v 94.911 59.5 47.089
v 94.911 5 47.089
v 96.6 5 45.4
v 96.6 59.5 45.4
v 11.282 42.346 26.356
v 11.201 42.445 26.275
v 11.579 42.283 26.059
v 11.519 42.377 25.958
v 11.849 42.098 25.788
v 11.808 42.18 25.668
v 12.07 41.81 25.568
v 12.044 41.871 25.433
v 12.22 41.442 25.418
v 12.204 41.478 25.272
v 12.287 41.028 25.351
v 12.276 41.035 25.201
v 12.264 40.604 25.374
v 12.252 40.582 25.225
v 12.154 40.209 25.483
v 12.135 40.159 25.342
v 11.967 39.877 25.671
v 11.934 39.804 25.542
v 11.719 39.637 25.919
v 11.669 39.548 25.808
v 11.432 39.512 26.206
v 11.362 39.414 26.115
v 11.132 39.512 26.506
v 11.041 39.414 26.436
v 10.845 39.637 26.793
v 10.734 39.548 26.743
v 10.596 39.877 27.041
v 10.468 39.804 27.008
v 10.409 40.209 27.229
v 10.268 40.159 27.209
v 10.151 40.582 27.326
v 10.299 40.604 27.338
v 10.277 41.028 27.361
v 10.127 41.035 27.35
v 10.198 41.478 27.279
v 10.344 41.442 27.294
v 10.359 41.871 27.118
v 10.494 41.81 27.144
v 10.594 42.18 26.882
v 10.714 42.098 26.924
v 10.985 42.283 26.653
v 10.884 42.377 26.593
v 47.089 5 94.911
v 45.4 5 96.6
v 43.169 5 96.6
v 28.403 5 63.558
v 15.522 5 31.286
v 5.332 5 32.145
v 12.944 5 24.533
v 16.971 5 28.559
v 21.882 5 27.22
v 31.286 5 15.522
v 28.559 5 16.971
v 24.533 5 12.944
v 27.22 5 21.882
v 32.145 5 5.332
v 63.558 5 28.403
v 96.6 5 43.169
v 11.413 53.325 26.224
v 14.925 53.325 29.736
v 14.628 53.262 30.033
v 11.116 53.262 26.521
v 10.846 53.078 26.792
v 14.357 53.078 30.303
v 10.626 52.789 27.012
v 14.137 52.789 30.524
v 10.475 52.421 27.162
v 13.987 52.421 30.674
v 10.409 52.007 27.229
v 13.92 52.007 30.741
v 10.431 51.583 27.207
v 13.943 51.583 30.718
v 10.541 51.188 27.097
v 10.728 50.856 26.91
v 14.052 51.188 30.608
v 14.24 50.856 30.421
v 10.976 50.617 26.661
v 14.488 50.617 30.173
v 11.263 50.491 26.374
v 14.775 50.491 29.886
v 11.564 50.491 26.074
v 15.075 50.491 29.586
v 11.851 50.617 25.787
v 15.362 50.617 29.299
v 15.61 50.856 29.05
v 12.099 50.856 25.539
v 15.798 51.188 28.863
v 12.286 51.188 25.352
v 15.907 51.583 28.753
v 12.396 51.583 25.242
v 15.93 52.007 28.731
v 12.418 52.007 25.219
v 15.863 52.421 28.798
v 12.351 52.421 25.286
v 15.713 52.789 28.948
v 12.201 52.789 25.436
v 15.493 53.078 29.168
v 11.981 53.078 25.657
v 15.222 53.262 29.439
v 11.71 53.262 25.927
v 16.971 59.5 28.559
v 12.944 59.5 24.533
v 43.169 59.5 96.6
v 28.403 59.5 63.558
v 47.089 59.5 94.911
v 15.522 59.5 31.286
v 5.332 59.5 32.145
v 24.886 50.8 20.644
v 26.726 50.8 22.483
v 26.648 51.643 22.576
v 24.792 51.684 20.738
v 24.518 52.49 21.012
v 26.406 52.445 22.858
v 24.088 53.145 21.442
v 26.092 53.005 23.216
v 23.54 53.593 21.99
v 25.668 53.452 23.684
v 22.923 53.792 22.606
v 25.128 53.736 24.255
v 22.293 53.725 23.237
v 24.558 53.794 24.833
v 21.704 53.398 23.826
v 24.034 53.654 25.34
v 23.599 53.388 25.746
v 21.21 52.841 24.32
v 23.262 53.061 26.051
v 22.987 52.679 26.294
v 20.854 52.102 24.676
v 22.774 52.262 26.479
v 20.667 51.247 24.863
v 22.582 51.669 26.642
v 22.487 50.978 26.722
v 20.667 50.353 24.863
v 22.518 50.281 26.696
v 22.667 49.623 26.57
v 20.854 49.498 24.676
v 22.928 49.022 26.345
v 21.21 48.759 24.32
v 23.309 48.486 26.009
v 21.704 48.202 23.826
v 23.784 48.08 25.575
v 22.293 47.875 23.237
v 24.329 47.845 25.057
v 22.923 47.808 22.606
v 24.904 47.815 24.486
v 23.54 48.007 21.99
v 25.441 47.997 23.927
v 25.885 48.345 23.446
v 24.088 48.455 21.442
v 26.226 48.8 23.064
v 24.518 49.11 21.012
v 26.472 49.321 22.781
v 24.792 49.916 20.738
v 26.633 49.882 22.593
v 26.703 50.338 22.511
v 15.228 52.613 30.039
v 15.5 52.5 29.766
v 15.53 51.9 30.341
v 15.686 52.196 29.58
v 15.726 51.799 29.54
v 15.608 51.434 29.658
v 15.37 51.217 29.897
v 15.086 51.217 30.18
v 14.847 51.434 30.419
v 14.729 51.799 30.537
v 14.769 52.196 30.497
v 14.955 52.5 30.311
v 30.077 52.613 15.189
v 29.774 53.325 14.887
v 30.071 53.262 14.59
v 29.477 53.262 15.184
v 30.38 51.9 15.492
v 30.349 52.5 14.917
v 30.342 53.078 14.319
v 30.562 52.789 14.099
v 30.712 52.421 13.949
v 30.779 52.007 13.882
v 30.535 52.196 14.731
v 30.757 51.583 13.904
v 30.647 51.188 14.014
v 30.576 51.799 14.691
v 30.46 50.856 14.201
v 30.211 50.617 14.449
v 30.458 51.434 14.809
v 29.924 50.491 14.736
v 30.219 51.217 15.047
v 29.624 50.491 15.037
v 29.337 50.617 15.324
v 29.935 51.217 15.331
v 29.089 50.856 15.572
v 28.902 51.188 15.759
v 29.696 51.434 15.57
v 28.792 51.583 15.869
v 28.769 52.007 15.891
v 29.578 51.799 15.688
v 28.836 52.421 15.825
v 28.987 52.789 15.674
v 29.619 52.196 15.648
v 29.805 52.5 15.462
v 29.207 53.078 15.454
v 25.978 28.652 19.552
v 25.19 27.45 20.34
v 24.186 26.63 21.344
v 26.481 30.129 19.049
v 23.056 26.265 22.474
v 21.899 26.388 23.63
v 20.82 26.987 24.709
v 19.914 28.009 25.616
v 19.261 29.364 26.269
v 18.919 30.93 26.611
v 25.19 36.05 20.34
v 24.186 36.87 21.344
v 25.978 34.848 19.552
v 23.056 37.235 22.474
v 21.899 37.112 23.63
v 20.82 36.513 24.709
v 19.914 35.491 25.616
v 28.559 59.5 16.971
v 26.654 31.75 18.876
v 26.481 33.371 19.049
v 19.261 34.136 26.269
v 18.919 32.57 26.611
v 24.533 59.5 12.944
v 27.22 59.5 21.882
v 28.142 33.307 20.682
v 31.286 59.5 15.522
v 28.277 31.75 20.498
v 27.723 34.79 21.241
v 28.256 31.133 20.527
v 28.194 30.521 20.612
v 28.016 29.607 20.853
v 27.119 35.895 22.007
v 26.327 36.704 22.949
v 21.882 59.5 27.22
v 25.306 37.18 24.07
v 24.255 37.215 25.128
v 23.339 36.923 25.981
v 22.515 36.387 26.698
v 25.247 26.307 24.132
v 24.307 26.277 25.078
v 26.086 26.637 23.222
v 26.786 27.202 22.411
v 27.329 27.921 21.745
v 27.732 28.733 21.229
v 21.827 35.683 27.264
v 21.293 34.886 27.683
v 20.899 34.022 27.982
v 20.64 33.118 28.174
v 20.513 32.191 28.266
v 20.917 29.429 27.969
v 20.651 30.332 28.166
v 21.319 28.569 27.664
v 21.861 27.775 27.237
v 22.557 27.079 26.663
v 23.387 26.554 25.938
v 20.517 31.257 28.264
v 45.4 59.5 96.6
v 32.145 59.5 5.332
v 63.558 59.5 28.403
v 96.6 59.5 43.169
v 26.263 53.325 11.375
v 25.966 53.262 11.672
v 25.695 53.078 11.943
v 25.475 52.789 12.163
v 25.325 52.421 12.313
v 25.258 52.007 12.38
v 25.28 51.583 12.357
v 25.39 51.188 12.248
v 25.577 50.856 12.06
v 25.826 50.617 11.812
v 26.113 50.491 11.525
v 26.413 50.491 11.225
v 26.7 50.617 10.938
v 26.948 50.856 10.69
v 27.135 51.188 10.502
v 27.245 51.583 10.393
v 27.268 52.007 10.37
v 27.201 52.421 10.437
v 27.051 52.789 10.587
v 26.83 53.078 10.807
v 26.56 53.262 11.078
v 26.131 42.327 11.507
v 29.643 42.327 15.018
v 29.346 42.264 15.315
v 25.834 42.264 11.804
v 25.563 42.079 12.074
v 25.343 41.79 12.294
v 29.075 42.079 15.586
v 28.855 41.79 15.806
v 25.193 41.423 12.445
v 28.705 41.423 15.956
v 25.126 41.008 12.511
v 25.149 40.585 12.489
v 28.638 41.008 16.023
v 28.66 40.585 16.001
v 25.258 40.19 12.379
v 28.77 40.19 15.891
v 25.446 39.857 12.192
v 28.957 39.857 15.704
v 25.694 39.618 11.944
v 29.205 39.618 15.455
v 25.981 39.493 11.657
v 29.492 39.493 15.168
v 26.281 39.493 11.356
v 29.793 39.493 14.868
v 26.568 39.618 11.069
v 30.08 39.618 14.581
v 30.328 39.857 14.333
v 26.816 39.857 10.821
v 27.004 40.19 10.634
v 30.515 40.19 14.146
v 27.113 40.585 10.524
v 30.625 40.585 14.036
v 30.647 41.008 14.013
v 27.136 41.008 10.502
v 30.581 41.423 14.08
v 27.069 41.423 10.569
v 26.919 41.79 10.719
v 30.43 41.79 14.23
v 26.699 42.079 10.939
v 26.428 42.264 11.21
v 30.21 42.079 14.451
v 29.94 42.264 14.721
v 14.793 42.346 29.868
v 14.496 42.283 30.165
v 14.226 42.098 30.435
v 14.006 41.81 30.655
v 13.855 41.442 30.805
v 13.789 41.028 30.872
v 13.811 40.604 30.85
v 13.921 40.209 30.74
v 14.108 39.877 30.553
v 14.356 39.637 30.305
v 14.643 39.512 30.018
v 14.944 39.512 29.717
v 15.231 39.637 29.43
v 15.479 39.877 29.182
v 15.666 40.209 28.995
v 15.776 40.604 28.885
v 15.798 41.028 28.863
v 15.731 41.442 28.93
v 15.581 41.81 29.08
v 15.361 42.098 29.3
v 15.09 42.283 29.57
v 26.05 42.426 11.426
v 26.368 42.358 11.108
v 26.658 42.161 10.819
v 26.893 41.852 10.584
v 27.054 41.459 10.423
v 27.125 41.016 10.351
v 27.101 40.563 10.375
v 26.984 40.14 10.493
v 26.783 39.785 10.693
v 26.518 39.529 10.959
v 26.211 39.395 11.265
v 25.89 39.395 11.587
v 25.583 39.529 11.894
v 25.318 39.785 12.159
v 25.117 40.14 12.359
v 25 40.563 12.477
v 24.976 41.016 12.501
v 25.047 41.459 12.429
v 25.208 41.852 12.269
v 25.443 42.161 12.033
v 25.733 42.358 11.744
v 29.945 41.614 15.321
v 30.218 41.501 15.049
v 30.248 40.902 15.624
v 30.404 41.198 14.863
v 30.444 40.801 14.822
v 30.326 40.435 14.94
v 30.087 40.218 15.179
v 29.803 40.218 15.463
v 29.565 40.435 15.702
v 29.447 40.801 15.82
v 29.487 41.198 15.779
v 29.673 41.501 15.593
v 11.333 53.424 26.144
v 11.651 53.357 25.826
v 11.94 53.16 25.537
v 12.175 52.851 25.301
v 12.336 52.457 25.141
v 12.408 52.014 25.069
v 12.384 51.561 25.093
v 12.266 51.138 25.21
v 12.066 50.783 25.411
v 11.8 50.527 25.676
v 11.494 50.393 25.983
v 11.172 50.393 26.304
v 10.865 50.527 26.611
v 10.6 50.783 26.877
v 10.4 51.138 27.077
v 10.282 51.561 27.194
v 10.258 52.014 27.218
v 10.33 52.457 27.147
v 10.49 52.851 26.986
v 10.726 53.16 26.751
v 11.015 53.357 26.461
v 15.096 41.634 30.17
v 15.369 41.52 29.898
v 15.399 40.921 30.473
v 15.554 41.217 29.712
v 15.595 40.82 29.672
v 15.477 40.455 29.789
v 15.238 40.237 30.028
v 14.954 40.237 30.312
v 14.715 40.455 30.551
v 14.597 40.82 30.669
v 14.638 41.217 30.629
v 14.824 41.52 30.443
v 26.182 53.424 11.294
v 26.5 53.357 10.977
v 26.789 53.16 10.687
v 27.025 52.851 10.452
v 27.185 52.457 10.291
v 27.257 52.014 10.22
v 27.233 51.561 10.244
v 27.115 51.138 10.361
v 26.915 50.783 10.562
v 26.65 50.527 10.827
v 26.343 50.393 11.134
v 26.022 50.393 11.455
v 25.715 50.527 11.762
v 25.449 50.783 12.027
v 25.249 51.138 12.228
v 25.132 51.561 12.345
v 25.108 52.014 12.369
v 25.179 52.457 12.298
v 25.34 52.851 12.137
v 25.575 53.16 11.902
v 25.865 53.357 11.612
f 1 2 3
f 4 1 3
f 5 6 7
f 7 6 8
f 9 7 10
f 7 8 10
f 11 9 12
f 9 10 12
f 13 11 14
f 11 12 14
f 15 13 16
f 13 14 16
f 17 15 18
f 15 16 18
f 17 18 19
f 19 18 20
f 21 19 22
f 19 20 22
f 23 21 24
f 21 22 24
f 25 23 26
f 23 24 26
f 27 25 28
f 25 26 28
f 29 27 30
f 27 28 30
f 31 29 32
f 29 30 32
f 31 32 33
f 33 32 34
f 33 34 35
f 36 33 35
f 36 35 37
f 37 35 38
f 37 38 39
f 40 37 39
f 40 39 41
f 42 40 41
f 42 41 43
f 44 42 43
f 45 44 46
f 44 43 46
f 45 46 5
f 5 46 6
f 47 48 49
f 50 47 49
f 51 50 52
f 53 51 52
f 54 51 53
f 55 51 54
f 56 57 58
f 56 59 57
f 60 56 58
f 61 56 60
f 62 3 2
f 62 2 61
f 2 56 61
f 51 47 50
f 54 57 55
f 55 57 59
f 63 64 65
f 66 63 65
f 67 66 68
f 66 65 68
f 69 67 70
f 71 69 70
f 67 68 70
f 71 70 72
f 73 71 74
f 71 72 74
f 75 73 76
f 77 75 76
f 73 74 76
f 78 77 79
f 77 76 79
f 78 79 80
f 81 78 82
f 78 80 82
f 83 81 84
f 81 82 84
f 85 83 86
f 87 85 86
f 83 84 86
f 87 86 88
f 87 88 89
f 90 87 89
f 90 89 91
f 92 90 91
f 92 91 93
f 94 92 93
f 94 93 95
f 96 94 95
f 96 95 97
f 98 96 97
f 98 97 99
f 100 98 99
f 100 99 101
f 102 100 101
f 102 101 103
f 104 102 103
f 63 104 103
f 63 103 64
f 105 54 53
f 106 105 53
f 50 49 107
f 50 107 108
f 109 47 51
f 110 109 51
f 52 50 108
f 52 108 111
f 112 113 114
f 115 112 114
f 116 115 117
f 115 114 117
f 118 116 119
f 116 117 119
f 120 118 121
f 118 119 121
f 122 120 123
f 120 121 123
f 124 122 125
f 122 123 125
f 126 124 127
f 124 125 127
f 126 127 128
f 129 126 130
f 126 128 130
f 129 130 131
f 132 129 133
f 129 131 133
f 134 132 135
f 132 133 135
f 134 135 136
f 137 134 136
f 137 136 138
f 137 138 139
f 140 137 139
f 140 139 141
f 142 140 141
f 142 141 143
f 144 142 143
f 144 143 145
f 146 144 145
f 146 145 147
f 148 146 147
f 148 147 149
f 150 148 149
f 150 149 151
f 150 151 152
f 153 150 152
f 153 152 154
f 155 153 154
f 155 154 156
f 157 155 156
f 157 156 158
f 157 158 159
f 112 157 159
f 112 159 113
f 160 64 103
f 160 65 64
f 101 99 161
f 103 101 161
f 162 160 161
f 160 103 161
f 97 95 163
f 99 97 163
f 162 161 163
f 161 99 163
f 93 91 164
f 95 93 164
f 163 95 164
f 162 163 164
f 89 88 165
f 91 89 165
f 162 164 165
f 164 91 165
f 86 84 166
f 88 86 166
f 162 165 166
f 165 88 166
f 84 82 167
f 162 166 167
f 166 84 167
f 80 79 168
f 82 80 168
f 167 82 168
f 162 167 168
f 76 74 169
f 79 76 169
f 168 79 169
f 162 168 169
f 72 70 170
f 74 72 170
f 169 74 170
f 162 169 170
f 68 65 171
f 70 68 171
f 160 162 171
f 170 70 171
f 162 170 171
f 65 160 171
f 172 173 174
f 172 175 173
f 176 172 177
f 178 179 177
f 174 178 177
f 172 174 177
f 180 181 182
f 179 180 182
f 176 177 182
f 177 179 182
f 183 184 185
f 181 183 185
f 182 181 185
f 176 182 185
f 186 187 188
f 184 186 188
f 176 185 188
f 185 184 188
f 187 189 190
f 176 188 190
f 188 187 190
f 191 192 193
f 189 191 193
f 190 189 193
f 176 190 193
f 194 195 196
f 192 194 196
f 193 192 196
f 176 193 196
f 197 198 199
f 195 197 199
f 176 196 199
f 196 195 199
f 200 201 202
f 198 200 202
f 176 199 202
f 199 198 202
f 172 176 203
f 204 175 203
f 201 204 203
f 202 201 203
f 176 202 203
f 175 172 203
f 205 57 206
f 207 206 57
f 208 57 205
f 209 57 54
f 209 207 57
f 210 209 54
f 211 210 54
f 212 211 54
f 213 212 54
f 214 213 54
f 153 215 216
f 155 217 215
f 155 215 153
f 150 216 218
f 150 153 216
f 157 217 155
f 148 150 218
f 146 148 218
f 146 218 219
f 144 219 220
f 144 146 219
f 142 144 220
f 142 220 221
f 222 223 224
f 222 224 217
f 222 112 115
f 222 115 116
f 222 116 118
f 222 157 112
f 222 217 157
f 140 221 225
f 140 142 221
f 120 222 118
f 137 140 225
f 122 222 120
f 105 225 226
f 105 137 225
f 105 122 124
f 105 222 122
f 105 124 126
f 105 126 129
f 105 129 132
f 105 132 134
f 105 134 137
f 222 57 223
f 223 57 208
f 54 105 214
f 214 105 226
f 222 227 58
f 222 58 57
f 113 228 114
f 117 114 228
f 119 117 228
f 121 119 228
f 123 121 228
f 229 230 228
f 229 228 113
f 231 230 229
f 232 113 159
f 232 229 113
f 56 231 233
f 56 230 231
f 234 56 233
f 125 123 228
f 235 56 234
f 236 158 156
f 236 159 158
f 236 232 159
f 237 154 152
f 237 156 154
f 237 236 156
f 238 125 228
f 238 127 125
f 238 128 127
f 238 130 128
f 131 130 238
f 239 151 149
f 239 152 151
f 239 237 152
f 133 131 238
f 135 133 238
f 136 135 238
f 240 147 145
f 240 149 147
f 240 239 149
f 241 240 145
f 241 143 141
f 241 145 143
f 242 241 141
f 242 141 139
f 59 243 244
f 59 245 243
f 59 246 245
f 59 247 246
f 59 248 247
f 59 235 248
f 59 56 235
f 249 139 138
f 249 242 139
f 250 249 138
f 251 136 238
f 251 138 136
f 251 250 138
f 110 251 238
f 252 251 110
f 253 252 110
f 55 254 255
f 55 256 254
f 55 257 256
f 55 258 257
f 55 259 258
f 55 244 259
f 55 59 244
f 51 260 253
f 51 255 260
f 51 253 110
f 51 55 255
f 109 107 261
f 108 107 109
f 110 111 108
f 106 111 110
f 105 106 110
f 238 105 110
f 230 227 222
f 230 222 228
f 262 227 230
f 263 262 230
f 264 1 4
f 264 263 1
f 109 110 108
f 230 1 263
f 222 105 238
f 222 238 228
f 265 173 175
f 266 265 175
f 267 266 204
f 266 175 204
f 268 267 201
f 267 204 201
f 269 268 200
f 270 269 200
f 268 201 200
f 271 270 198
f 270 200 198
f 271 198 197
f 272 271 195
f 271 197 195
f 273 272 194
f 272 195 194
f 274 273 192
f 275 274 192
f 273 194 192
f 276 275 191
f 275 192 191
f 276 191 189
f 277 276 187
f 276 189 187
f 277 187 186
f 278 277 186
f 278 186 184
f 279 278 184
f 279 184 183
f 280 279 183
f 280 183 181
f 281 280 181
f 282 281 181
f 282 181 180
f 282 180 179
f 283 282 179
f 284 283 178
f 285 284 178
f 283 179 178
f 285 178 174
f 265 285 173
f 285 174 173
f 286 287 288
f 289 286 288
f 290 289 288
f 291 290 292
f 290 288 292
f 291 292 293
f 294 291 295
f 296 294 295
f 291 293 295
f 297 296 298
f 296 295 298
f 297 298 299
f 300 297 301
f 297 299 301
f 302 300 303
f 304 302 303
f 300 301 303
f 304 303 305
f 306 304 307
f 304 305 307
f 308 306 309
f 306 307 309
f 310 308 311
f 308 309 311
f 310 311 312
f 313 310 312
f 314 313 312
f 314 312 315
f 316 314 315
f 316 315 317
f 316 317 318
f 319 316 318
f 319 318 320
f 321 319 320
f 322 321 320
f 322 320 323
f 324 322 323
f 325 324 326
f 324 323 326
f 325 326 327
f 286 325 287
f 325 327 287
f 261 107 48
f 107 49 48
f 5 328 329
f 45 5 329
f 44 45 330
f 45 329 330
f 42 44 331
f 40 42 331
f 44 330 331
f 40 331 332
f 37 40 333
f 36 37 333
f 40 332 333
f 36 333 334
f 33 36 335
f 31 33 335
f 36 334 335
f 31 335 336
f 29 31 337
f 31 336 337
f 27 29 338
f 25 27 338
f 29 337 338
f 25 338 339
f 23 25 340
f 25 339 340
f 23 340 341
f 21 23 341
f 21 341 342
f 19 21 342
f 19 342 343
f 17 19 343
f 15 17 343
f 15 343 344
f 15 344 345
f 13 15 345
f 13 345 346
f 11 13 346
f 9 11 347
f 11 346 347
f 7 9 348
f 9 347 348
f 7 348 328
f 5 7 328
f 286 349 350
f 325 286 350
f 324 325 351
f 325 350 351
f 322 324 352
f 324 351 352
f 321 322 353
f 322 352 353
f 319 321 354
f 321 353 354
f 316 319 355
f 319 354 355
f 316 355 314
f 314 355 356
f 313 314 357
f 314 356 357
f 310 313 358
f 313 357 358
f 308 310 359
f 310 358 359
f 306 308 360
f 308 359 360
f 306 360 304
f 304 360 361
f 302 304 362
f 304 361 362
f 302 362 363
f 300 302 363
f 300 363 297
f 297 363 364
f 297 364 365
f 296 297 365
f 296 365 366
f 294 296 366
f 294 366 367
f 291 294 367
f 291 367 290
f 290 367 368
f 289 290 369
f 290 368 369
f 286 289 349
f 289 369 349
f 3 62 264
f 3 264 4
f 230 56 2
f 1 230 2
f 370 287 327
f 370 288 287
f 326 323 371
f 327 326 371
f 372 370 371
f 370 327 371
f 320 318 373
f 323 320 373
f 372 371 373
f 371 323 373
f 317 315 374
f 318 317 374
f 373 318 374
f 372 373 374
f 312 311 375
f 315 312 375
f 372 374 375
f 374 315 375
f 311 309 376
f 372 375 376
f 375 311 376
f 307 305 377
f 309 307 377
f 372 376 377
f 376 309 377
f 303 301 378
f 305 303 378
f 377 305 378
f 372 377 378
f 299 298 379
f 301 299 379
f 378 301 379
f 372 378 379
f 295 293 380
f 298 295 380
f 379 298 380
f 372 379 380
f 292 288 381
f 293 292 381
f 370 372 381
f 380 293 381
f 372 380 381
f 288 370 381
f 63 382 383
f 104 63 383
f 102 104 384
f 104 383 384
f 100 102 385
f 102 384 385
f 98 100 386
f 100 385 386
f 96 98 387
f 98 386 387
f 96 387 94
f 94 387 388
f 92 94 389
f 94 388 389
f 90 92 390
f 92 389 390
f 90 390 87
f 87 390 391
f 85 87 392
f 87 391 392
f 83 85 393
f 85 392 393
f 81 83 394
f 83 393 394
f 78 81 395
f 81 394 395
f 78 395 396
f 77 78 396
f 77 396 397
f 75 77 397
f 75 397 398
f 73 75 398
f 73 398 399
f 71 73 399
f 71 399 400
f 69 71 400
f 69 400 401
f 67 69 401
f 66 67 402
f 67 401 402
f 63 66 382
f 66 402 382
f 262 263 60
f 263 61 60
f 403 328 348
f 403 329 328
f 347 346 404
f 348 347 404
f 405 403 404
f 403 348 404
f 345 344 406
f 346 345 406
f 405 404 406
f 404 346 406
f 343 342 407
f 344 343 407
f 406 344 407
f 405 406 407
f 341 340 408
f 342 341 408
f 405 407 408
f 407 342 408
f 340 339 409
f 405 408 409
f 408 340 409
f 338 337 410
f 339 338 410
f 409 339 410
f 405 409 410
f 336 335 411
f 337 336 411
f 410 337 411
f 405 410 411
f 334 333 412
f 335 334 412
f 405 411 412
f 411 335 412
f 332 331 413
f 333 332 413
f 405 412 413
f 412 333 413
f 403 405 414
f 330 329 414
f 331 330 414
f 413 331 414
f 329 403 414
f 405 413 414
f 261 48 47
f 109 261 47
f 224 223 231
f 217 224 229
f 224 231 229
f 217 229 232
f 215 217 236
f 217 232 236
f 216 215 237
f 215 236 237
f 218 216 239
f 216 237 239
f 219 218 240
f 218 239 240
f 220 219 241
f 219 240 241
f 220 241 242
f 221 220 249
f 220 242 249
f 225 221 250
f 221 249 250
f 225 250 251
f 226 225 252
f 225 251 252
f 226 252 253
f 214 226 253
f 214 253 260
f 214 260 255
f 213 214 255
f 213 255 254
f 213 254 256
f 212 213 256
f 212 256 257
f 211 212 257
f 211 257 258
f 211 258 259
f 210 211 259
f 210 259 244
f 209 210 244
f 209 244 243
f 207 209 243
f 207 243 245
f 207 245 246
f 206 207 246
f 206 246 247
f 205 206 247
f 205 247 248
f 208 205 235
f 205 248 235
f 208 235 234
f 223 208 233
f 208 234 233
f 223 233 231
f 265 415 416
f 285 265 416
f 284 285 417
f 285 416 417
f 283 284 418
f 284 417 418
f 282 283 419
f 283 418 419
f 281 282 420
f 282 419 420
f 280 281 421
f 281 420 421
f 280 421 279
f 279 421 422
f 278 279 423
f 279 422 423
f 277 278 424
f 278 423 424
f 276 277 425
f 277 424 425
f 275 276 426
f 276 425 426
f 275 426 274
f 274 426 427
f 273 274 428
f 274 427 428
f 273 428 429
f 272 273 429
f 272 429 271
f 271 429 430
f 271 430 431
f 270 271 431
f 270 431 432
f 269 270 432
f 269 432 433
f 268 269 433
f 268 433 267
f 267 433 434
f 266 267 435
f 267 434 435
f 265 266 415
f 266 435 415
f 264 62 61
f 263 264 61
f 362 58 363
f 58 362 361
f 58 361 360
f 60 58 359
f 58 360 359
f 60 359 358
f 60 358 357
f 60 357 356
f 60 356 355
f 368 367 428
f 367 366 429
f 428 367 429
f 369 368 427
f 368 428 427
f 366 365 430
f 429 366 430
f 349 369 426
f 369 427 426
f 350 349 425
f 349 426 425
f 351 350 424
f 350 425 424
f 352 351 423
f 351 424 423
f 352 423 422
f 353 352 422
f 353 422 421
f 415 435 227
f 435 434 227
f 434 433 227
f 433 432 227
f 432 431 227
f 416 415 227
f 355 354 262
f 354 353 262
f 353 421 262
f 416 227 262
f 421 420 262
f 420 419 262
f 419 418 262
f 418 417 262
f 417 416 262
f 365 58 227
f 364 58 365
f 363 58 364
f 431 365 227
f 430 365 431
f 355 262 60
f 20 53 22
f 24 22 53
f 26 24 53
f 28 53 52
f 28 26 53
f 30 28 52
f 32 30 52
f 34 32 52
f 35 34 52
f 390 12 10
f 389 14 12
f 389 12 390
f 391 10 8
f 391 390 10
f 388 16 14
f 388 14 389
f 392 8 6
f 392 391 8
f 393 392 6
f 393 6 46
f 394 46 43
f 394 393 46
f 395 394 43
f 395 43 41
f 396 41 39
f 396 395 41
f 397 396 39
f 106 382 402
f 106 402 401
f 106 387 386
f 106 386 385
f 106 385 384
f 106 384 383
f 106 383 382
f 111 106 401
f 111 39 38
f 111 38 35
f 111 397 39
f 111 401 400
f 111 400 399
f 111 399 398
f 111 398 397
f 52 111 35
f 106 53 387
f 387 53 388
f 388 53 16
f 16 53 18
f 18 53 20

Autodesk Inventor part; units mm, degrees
ref_plane "YZ Plane" through (0, 0, 0) normal (1, 0, 0) x (0, 1, 0)
ref_plane "XZ Plane" through (0, 0, 0) normal (0, 1, 0) x (-1, 0, 0)
sketch "Sketch1" plane through (0, 0, 0) normal (0, 1, 0) x (-1, 0, 0)
  line L0 (101.6, -101.6) -> (-101.6, -101.6)
  line L1 (-101.6, -101.6) -> (-101.6, 101.6)
  line L2 (-101.6, 101.6) -> (101.6, 101.6)
  line L3 (101.6, 101.6) -> (101.6, -101.6)
  line L4 (96.6, -96.6) -> (-96.6, -96.6)
  line L5 (-96.6, -96.6) -> (-96.6, 96.6)
  line L6 (-96.6, 96.6) -> (96.6, 96.6)
  line L7 (96.6, 96.6) -> (96.6, -96.6)
  line L8 (101.6, 101.6) -> (-40.4, 101.6)
  circle A0 centre (0, 0) radius 88.9
  circle A1 centre (0, 0) radius 109.3376
  line L9 (-40.4, 101.6) -> (-101.6, 40.4)
  line L10 (-45.4, 101.6) -> (-101.6, 45.4)
  line L11 (96.6, 96.6) -> (96.6, 101.6)
  line L12 (-45.4, 101.6) -> (-35.4, 101.6)
  line L13 (-35.4, 101.6) -> (-35.4, 96.6)
  line L14 (-35.4, 96.6) -> (-45.4, 96.6)
  line L15 (-45.4, 96.6) -> (-45.4, 101.6)
  line L16 (-45.4, 101.6) -> (-43.114, 101.6)
  line L17 (-43.114, 101.6) -> (-43.114, 96.6)
  line L18 (-43.114, 96.6) -> (-45.4, 96.6)
  line L19 (-45.4, 96.6) -> (-45.4, 101.6)
  line L20 (-96.6, 45.4) -> (-101.6, 45.4)
  line L21 (-101.6, 45.4) -> (-101.6, 43.114)
  line L22 (-101.6, 43.114) -> (-96.6, 43.114)
  line L23 (-96.6, 43.114) -> (-96.6, 45.4)
  point P0 (96.6, 51.2168)
  point P1 (101.6, 40.4)
  point P2 (101.6, -40.4)
  point P3 (96.6, -51.2168)
  point P4 (-96.6, 45.4)
  point P5 (-45.4, 96.6)
  dimension "d0" = 203.2
  dimension "d1" = 203.2
  dimension "d2" = 101.6
  dimension "d3" = 101.6
  dimension "d4" = 5
  dimension "d5" = 5
  dimension "d6" = 5
  dimension "d7" = 5
  dimension "d10" = 142
  dimension "d12" = 61.2
  dimension "d14" = 177.8
  dimension "d15" = 5
  dimension "d16" = 5
  dimension "d17" = 10
  dimension "d86" = 2.286
  dimension "d87" = 2.286
extrude "Extrusion1" add sketch "Sketch1" along normal blind 5 contours L0 A1 L4 L7 L3 | L0 A1 L4 | A1 L7 L3 | L0 L1 A1 L5 L4 | A1 L7 L4 | L4 A1 L5 L9 L6 L7 | A1 L7 L11 L2 L3 | L4 L5 A1 | A1 L6 L7 | L1 L9 L22 L5 A1 | L11 L6 A1 L2 | L6 L13 L2 A1 | L1 L22 A1 | A1 L22 L9 | L22 L9 L5 | L6 L17 L9 L2 L13 | L1 L20 A1 L22 | A1 L20 L9 L22 | L20 A1 L10 L5 | L5 L10 L6 L9 | A1 L17 L2 | L9 L17 A1 | L6 L9 L17 | L1 L2 L10 A1 L6 L5 | L10 A1 L20 | L10 A1 L5 | L5 A1 L6 L10 | L15 A1 L17 L9 | L6 L10 A1 L15 | L17 A1 L15 L2 | L5 L6 A1 | L6 A1 L10 | A1 L10 L15 | A0
sketch "Sketch3" plane through (0, 5, 0) normal (0, 1, 0) x (1, 0, 0)
  circle A0 centre (0, 0) radius 88.9
  line L0 (-101.6, 101.6) -> (-101.6, -101.6) projected
  line L1 (-101.6, -101.6) -> (101.6, -101.6) projected
  line L2 (-101.6, 101.6) -> (101.6, 101.6)
  line L3 (101.6, 101.6) -> (101.6, -101.6)
  line L4 (101.6, -101.6) -> (-101.6, -101.6)
  line L5 (-101.6, -101.6) -> (-101.6, 101.6)
  line L6 (-96.6, 96.6) -> (96.6, 96.6)
  line L7 (96.6, 96.6) -> (96.6, -96.6)
  line L8 (96.6, -96.6) -> (-96.6, -96.6)
  line L9 (-96.6, -96.6) -> (-96.6, 96.6)
  line L10 (-101.6, -101.6) -> (40.4, -101.6)
  circle A1 centre (0, 0) radius 109.3376
  line L11 (40.4, -101.6) -> (101.6, -40.4)
  line L12 (101.6, -101.6) -> (101.6, 101.6) projected
  line L13 (45.4038, -101.6) -> (101.6, -45.4038)
  line L14 (96.6, -45.4) -> (101.6, -45.4038)
  line L15 (45.4, -96.6) -> (45.4038, -101.6)
  line L16 (96.6, -45.4) -> (101.6, -45.4)
  line L17 (101.6, -45.4) -> (101.6, -43.114)
  line L18 (101.6, -43.114) -> (96.6, -43.114)
  line L19 (96.6, -43.114) -> (96.6, -45.4)
  line L20 (45.4038, -101.6) -> (43.1178, -101.6)
  line L21 (43.1178, -101.6) -> (43.1178, -96.6)
  line L22 (43.1178, -96.6) -> (45.4038, -96.6)
  line L23 (45.4038, -96.6) -> (45.4038, -101.6)
  point P0 (45.4038, -101.6)
  point P1 (50.4038, -96.6)
  point P2 (96.6, -50.4038)
  dimension "d28" = 177.8
  dimension "d29" = 5
  dimension "d30" = 5
  dimension "d31" = 5
  dimension "d32" = 5
  dimension "d33" = 142
  dimension "d76" = 5.0038
  dimension "d77" = 5.0038
  dimension "d88" = 2.286
  dimension "d89" = 2.286
extrude "Extrusion3" cut sketch "Sketch3" against normal blind 2 contours L2 A1 L6 L9 L0 | A1 L9 L0 | L2 A1 L6 | A1 L9 L8 L1 L0 | L2 L3 A1 L7 L6 | A1 L8 L21 L11 L1 | L3 L11 L18 L7 A1 | A1 L21 L1 | L11 L21 A1 | L3 L18 A1 | A1 L18 L11
sketch "Sketch4" plane through (0, 5, 0) normal (0, 1, 0) x (1, 0, 0)
  line L0 (101.6, 101.6) -> (-101.6, 101.6)
  line L1 (-101.6, 101.6) -> (-101.6, -101.6)
  line L2 (-101.6, -101.6) -> (101.6, -101.6)
  line L3 (101.6, -101.6) -> (101.6, 101.6)
  circle A0 centre (0, 0) radius 2.5
  line L4 (11.3314, 2.139) -> (-2.139, -11.3314)
  line L5 (0, 0) -> (-5.6569, 5.6569)
  line L6 (-5.6569, -14.8492) -> (-26.163, 5.6569)
  line L7 (-5.6569, 26.163) -> (14.8492, 5.6569)
  circle A1 centre (-5.6569, 5.6569) radius 14
  line L8 (-26.163, 5.6569) -> (-5.6569, 26.163)
  line L9 (14.8492, 5.6569) -> (-5.6569, -14.8492)
  line L10 (-40.3051, 5.6569) -> (-5.6569, 40.3051)
  line L11 (-5.6569, 40.3051) -> (28.9914, 5.6569)
  line L12 (28.9914, 5.6569) -> (-5.6569, -28.9914)
  line L13 (-5.6569, -28.9914) -> (-40.3051, 5.6569)
  line L14 (-22.6451, 9.1747) -> (-9.1747, 22.6451)
  line L15 (-9.1747, 22.6451) -> (-12.7668, 26.2372)
  line L16 (-12.7668, 26.2372) -> (-26.2372, 12.7668)
  line L17 (-26.2372, 12.7668) -> (-22.6451, 9.1747)
  point P0 (9.525, 22.5)
  point P1 (-9.525, -6.5)
  dimension "d37" = 203.2
  dimension "d38" = 203.2
  dimension "d39" = 8
  dimension "d40" = 28
  dimension "d41" = 29
  dimension "d42" = 29
  dimension "d43" = 14.5
  dimension "d44" = 10
  dimension "d45" = 10
  dimension "d46" = 10
  dimension "d47" = 10
  dimension "d48" = 5.08
  dimension "d49" = 9.525
  dimension "d50" = 9.525
  dimension "d55" = 101.6
  dimension "d56" = 101.6
extrude "Extrusion4" cut sketch "Sketch4" against normal blind 1 contours A0 | L4 L9 L6 L8 L7 | L8 L17 L16 L15 | A1 | L10 L11 L12 L13
sketch "Sketch6" plane through (0, 5, 0) normal (0, 1, 0) x (1, 0, 0)
  line L0 (45.4038, -101.6) -> (0, 0)
  line L1 (50.4038, -96.6) -> (45.4038, -101.6) projected
  line L2 (96.6, -43.114) -> (96.6, 96.6) projected
  line L3 (101.6, -101.6) -> (101.6, 101.6) projected
  circle A0 centre (0, 0) radius 34.925
  circle A1 centre (0, 0) radius 33.425
  line L4 (-101.6, 101.6) -> (-101.6, -101.6) projected
  line L5 (-101.6, -101.6) -> (40.4, -101.6)
  line L6 (-101.6, -101.6) -> (101.6, -101.6) projected
  line L7 (101.6, 101.6) -> (101.6, -43.114) projected
  line L8 (101.6, -45.4038) -> (0, 0)
  line L9 (-96.6, -96.6) -> (43.1178, -96.6) projected
  line L10 (96.6, -43.114) -> (96.6, 96.6) projected
  line L11 (43.1178, -101.6) -> (-101.6, -101.6) projected
  line L12 (101.6, -45.4038) -> (96.6, -50.4038) projected
  line L13 (45.4038, -101.6) -> (101.6, -45.4038)
  line L14 (43.1178, -101.6) -> (101.6, -101.6) projected
  line L15 (0, 0) -> (101.6, -50.4076)
  line L16 (50.4076, -101.6) -> (0, 0)
  line L17 (43.1694, -96.6) -> (47.9269, -96.6)
  line L18 (96.6, -43.1694) -> (96.6, -47.9269)
  line L19 (40.4, -101.6) -> (101.6, -40.4)
  point P0 (13.6374, -30.5164)
  point P1 (30.5164, -13.6374)
  point P2 (14.2494, -31.8859)
  point P3 (31.2861, -15.5222)
  point P4 (29.9423, -14.8555)
  point P5 (31.8859, -14.2494)
  point P6 (98.2555, -48.7483)
  point P7 (96.6, -47.9269)
  point P8 (47.9269, -96.6)
  point P9 (15.5222, -31.2861)
  point P10 (96.6, -45.4)
  point P11 (45.4, -96.6)
  point P12 (14.8555, -29.9423)
  point P13 (96.6, -45.4)
  point P14 (45.4, -96.6)
  point P15 (45.4, -96.6)
  point P16 (47.089, -94.911)
  point P17 (94.911, -47.089)
  point P18 (96.6, -45.4)
  point P19 (43.8583, -98.1417)
  point P20 (98.1417, -43.8583)
  point P21 (45.4, -96.6)
  point P22 (96.6, -45.4)
  dimension "d71" = 69.85
  dimension "d72" = 66.85
  dimension "d75" = 142
  dimension "d78" = 5.0038
  dimension "d82" = 5.0038
extrude "Extrusion6" add sketch "Sketch6" along normal blind 54.5 contours L0 A0 L16 L19 L17 | L0 A1 L16 A0 | L16 A1 L15 A0 | L15 A0 L8 L18 L19 | A0 L15 A1 L8
fillet "Fillet3" radius 12.7 1 edges at (101.6, 2.5, 101.6)
sketch "Sketch9" plane through (0, 4, 0) normal (0, 1, 0) x (1, 0, 0)
  point P0 (0, 0)
sketch "Sketch10" plane through (0, 5, 0) normal (0, 1, 0) x (1, 0, 0)
  point P0 (0, 0)
ref_plane "Work Plane1" through (24.6957, 5, 24.6957) normal (0.7071068, 0, 0.7071068) x (0.7071068, 0, -0.7071068)
sketch "Sketch15" plane through (0, 5, 0) normal (0, 1, 0) x (1, 0, 0)
  line L0 (13.6374, -30.5164) -> (43.1694, -96.6) projected
  line L1 (28.4034, -63.5582) -> (-0.6569, -23.9914)
  line L2 (28.9914, 5.6569) -> (-5.6569, -28.9914) projected
  line L3 (96.6, -43.1694) -> (30.5164, -13.6374) projected
  line L4 (-5.6569, 40.3051) -> (28.9914, 5.6569) projected
  line L5 (63.5582, -28.4034) -> (23.9914, 0.6569)
  line L6 (2.3374, -28.0682) -> (28.0682, -2.3374)
  arc A0 (13.6374, -30.5164) -> (30.5164, -13.6374) centre (0, 0) ccw projected
  line L7 (28.4034, -63.5582) -> (13.6374, -30.5164)
  line L8 (63.5582, -28.4034) -> (30.5164, -13.6374)
  arc A1 (13.6374, -30.5164) -> (30.5164, -13.6374) centre (0, 0) ccw
  dimension "d138" = 5
  dimension "d139" = 5
  dimension "d140" = 5
extrude "Extrusion11" add sketch "Sketch15" along normal up to surface (54.5 mm away) contours L0 L1 L6 L5 L3 A0
sketch "Sketch16" plane through (0, 59.5, 0) normal (0, 1, 0) x (1, 0, 0)
  line L0 (2.3374, -28.0682) -> (28.0682, -2.3374) projected
  line L1 (9.4085, -20.9971) -> (12.944, -24.5327)
  line L2 (12.944, -24.5327) -> (24.5327, -12.944)
  line L3 (24.5327, -12.944) -> (20.9971, -9.4085)
  line L4 (12.944, -24.5327) -> (24.5327, -12.944)
  line L5 (24.5327, -12.944) -> (28.5592, -16.9706)
  line L6 (28.5592, -16.9706) -> (16.9706, -28.5592)
  line L7 (16.9706, -28.5592) -> (12.944, -24.5327)
  line L8 (12.944, -24.5327) -> (5.3317, -32.145)
  line L9 (28.4034, -63.5582) -> (2.3374, -28.0682) projected
  line L10 (24.5327, -12.944) -> (32.145, -5.3317)
  line L11 (28.0682, -2.3374) -> (63.5582, -28.4034) projected
  point P0 (0, 0)
  dimension "d144" = 10
  dimension "d145" = 10
  dimension "d146" = 5
  dimension "d152" = 0
  dimension "d153" = 0
extrude "Extrusion12" cut sketch "Sketch16" against normal up to surface (54.5 mm away)
sketch "Sketch11" plane through (24.6957, 5, 24.6957) normal (0.7071068, 0, 0.7071068) x (0.7071068, 0, -0.7071068)
  line L0 (143.6841, -5) -> (0, -5) projected
  line L1 (0, -5) -> (0, 26.75)
  circle A0 centre (0, 26.75) radius 5.5
  line L2 (0, 26.75) -> (0, 45.8)
  circle A1 centre (0, 45.8) radius 3
  dimension "d120" = 31.75
  dimension "d121" = 11
  dimension "d171" = 19.05
  dimension "d172" = 6
extrude "Extrusion8" cut sketch "Sketch11" against normal blind 127
sketch "Sketch17" plane through (5.3317, 5, 32.145) normal (-0.7071068, 0, -0.7071068) x (-0.7071068, 0, 0.7071068)
  circle A0 centre (-29.4679, 45.7716) radius 1.1146
  circle A1 centre (-8.4493, 45.7716) radius 1.1245
  circle A2 centre (-8.4493, 33.2324) radius 1.229
  circle A3 centre (-29.4679, 33.2324) radius 1.2635
  line L0 (-29.4679, 45.7716) -> (-8.4493, 45.7716)
  line L1 (-8.4493, 45.7716) -> (-8.4493, 33.2324)
  line L2 (-8.4493, 33.2324) -> (-29.4679, 33.2324)
  line L3 (-29.4679, 33.2324) -> (-29.4679, 45.7716)
  line L4 (-24.4164, 38.6993) -> (-13.5188, 38.6993)
  line L5 (-13.5188, 38.6993) -> (-13.5188, 27.7864)
  line L6 (-13.5188, 27.7864) -> (-24.4164, 27.7864)
  line L7 (-24.4164, 27.7864) -> (-24.4164, 38.6993)
  line L8 (-31.5058, 47.9379) -> (-6.5058, 47.9379)
  line L9 (-6.5058, 47.9379) -> (-6.5058, 23.4716)
  line L10 (-6.5058, 23.4716) -> (-31.5058, 23.4716)
  line L11 (-31.5058, 23.4716) -> (-31.5058, 47.9379)
  line L12 (-18.9599, -5) -> (-18.9599, 33.1)
  point P0 (-29.4871, 46.9004)
  point P1 (-8.4871, 46.9004)
  point P2 (-8.3009, 35.9211)
  point P3 (-29.3009, 35.902)
  dimension "d185" = 21.0186
  dimension "d186" = 12.5392
  dimension "d187" = 2.249
  dimension "d188" = 25
  dimension "d189" = 24.4663
  dimension "d190" = 38.1
  dimension "d191" = 5.4565
  dimension "d192" = 5.4411
hole "Hole1" at (26.1822, 51.9004, 11.2945) at (26.0505, 40.902, 11.4261) at (11.3329, 51.9004, 26.1437) at (11.2013, 40.9211, 26.2754) direction (0.7071068, 0, 0.7071068) diameter 2.85 depth 5.08 tip angle 118 countersink diameter 3.048 countersink angle 82 thread size "M3.5x0.6" class "6H" standard "ANSI Metric M Profile"
sketch "Sketch18" plane through (101.6, 3, 43.114) normal (1, 0, 0) x (0, 0, -1)
  line L0 (-53.486, 2) -> (-58.486, 2) projected
  line L1 (-58.486, 2) -> (145.4353, 2)
  line L2 (145.4353, 2) -> (145.4353, -4.8825)
  line L3 (145.4353, -4.8825) -> (-58.486, -4.8825)
  line L4 (-58.486, -4.8825) -> (-58.486, 2)
  point P0 (43.114, -3)
extrude "Extrusion13" cut sketch "Sketch18" against normal through all
sketch "Sketch21" plane through (0, 59.5, 0) normal (0, 1, 0) x (1, 0, 0)
  line L0 (0, 0) -> (73.3665, -73.3665)
  line L1 (0, 0) -> (103.756, 0) construction
  dimension "d173" = 45
equation "\"d1\" = d0"
equation "\"d2\" = 0.5 * d0"
equation "\"d3\" = 0.5 * d0"
properties part number "Box_Walls_2"
